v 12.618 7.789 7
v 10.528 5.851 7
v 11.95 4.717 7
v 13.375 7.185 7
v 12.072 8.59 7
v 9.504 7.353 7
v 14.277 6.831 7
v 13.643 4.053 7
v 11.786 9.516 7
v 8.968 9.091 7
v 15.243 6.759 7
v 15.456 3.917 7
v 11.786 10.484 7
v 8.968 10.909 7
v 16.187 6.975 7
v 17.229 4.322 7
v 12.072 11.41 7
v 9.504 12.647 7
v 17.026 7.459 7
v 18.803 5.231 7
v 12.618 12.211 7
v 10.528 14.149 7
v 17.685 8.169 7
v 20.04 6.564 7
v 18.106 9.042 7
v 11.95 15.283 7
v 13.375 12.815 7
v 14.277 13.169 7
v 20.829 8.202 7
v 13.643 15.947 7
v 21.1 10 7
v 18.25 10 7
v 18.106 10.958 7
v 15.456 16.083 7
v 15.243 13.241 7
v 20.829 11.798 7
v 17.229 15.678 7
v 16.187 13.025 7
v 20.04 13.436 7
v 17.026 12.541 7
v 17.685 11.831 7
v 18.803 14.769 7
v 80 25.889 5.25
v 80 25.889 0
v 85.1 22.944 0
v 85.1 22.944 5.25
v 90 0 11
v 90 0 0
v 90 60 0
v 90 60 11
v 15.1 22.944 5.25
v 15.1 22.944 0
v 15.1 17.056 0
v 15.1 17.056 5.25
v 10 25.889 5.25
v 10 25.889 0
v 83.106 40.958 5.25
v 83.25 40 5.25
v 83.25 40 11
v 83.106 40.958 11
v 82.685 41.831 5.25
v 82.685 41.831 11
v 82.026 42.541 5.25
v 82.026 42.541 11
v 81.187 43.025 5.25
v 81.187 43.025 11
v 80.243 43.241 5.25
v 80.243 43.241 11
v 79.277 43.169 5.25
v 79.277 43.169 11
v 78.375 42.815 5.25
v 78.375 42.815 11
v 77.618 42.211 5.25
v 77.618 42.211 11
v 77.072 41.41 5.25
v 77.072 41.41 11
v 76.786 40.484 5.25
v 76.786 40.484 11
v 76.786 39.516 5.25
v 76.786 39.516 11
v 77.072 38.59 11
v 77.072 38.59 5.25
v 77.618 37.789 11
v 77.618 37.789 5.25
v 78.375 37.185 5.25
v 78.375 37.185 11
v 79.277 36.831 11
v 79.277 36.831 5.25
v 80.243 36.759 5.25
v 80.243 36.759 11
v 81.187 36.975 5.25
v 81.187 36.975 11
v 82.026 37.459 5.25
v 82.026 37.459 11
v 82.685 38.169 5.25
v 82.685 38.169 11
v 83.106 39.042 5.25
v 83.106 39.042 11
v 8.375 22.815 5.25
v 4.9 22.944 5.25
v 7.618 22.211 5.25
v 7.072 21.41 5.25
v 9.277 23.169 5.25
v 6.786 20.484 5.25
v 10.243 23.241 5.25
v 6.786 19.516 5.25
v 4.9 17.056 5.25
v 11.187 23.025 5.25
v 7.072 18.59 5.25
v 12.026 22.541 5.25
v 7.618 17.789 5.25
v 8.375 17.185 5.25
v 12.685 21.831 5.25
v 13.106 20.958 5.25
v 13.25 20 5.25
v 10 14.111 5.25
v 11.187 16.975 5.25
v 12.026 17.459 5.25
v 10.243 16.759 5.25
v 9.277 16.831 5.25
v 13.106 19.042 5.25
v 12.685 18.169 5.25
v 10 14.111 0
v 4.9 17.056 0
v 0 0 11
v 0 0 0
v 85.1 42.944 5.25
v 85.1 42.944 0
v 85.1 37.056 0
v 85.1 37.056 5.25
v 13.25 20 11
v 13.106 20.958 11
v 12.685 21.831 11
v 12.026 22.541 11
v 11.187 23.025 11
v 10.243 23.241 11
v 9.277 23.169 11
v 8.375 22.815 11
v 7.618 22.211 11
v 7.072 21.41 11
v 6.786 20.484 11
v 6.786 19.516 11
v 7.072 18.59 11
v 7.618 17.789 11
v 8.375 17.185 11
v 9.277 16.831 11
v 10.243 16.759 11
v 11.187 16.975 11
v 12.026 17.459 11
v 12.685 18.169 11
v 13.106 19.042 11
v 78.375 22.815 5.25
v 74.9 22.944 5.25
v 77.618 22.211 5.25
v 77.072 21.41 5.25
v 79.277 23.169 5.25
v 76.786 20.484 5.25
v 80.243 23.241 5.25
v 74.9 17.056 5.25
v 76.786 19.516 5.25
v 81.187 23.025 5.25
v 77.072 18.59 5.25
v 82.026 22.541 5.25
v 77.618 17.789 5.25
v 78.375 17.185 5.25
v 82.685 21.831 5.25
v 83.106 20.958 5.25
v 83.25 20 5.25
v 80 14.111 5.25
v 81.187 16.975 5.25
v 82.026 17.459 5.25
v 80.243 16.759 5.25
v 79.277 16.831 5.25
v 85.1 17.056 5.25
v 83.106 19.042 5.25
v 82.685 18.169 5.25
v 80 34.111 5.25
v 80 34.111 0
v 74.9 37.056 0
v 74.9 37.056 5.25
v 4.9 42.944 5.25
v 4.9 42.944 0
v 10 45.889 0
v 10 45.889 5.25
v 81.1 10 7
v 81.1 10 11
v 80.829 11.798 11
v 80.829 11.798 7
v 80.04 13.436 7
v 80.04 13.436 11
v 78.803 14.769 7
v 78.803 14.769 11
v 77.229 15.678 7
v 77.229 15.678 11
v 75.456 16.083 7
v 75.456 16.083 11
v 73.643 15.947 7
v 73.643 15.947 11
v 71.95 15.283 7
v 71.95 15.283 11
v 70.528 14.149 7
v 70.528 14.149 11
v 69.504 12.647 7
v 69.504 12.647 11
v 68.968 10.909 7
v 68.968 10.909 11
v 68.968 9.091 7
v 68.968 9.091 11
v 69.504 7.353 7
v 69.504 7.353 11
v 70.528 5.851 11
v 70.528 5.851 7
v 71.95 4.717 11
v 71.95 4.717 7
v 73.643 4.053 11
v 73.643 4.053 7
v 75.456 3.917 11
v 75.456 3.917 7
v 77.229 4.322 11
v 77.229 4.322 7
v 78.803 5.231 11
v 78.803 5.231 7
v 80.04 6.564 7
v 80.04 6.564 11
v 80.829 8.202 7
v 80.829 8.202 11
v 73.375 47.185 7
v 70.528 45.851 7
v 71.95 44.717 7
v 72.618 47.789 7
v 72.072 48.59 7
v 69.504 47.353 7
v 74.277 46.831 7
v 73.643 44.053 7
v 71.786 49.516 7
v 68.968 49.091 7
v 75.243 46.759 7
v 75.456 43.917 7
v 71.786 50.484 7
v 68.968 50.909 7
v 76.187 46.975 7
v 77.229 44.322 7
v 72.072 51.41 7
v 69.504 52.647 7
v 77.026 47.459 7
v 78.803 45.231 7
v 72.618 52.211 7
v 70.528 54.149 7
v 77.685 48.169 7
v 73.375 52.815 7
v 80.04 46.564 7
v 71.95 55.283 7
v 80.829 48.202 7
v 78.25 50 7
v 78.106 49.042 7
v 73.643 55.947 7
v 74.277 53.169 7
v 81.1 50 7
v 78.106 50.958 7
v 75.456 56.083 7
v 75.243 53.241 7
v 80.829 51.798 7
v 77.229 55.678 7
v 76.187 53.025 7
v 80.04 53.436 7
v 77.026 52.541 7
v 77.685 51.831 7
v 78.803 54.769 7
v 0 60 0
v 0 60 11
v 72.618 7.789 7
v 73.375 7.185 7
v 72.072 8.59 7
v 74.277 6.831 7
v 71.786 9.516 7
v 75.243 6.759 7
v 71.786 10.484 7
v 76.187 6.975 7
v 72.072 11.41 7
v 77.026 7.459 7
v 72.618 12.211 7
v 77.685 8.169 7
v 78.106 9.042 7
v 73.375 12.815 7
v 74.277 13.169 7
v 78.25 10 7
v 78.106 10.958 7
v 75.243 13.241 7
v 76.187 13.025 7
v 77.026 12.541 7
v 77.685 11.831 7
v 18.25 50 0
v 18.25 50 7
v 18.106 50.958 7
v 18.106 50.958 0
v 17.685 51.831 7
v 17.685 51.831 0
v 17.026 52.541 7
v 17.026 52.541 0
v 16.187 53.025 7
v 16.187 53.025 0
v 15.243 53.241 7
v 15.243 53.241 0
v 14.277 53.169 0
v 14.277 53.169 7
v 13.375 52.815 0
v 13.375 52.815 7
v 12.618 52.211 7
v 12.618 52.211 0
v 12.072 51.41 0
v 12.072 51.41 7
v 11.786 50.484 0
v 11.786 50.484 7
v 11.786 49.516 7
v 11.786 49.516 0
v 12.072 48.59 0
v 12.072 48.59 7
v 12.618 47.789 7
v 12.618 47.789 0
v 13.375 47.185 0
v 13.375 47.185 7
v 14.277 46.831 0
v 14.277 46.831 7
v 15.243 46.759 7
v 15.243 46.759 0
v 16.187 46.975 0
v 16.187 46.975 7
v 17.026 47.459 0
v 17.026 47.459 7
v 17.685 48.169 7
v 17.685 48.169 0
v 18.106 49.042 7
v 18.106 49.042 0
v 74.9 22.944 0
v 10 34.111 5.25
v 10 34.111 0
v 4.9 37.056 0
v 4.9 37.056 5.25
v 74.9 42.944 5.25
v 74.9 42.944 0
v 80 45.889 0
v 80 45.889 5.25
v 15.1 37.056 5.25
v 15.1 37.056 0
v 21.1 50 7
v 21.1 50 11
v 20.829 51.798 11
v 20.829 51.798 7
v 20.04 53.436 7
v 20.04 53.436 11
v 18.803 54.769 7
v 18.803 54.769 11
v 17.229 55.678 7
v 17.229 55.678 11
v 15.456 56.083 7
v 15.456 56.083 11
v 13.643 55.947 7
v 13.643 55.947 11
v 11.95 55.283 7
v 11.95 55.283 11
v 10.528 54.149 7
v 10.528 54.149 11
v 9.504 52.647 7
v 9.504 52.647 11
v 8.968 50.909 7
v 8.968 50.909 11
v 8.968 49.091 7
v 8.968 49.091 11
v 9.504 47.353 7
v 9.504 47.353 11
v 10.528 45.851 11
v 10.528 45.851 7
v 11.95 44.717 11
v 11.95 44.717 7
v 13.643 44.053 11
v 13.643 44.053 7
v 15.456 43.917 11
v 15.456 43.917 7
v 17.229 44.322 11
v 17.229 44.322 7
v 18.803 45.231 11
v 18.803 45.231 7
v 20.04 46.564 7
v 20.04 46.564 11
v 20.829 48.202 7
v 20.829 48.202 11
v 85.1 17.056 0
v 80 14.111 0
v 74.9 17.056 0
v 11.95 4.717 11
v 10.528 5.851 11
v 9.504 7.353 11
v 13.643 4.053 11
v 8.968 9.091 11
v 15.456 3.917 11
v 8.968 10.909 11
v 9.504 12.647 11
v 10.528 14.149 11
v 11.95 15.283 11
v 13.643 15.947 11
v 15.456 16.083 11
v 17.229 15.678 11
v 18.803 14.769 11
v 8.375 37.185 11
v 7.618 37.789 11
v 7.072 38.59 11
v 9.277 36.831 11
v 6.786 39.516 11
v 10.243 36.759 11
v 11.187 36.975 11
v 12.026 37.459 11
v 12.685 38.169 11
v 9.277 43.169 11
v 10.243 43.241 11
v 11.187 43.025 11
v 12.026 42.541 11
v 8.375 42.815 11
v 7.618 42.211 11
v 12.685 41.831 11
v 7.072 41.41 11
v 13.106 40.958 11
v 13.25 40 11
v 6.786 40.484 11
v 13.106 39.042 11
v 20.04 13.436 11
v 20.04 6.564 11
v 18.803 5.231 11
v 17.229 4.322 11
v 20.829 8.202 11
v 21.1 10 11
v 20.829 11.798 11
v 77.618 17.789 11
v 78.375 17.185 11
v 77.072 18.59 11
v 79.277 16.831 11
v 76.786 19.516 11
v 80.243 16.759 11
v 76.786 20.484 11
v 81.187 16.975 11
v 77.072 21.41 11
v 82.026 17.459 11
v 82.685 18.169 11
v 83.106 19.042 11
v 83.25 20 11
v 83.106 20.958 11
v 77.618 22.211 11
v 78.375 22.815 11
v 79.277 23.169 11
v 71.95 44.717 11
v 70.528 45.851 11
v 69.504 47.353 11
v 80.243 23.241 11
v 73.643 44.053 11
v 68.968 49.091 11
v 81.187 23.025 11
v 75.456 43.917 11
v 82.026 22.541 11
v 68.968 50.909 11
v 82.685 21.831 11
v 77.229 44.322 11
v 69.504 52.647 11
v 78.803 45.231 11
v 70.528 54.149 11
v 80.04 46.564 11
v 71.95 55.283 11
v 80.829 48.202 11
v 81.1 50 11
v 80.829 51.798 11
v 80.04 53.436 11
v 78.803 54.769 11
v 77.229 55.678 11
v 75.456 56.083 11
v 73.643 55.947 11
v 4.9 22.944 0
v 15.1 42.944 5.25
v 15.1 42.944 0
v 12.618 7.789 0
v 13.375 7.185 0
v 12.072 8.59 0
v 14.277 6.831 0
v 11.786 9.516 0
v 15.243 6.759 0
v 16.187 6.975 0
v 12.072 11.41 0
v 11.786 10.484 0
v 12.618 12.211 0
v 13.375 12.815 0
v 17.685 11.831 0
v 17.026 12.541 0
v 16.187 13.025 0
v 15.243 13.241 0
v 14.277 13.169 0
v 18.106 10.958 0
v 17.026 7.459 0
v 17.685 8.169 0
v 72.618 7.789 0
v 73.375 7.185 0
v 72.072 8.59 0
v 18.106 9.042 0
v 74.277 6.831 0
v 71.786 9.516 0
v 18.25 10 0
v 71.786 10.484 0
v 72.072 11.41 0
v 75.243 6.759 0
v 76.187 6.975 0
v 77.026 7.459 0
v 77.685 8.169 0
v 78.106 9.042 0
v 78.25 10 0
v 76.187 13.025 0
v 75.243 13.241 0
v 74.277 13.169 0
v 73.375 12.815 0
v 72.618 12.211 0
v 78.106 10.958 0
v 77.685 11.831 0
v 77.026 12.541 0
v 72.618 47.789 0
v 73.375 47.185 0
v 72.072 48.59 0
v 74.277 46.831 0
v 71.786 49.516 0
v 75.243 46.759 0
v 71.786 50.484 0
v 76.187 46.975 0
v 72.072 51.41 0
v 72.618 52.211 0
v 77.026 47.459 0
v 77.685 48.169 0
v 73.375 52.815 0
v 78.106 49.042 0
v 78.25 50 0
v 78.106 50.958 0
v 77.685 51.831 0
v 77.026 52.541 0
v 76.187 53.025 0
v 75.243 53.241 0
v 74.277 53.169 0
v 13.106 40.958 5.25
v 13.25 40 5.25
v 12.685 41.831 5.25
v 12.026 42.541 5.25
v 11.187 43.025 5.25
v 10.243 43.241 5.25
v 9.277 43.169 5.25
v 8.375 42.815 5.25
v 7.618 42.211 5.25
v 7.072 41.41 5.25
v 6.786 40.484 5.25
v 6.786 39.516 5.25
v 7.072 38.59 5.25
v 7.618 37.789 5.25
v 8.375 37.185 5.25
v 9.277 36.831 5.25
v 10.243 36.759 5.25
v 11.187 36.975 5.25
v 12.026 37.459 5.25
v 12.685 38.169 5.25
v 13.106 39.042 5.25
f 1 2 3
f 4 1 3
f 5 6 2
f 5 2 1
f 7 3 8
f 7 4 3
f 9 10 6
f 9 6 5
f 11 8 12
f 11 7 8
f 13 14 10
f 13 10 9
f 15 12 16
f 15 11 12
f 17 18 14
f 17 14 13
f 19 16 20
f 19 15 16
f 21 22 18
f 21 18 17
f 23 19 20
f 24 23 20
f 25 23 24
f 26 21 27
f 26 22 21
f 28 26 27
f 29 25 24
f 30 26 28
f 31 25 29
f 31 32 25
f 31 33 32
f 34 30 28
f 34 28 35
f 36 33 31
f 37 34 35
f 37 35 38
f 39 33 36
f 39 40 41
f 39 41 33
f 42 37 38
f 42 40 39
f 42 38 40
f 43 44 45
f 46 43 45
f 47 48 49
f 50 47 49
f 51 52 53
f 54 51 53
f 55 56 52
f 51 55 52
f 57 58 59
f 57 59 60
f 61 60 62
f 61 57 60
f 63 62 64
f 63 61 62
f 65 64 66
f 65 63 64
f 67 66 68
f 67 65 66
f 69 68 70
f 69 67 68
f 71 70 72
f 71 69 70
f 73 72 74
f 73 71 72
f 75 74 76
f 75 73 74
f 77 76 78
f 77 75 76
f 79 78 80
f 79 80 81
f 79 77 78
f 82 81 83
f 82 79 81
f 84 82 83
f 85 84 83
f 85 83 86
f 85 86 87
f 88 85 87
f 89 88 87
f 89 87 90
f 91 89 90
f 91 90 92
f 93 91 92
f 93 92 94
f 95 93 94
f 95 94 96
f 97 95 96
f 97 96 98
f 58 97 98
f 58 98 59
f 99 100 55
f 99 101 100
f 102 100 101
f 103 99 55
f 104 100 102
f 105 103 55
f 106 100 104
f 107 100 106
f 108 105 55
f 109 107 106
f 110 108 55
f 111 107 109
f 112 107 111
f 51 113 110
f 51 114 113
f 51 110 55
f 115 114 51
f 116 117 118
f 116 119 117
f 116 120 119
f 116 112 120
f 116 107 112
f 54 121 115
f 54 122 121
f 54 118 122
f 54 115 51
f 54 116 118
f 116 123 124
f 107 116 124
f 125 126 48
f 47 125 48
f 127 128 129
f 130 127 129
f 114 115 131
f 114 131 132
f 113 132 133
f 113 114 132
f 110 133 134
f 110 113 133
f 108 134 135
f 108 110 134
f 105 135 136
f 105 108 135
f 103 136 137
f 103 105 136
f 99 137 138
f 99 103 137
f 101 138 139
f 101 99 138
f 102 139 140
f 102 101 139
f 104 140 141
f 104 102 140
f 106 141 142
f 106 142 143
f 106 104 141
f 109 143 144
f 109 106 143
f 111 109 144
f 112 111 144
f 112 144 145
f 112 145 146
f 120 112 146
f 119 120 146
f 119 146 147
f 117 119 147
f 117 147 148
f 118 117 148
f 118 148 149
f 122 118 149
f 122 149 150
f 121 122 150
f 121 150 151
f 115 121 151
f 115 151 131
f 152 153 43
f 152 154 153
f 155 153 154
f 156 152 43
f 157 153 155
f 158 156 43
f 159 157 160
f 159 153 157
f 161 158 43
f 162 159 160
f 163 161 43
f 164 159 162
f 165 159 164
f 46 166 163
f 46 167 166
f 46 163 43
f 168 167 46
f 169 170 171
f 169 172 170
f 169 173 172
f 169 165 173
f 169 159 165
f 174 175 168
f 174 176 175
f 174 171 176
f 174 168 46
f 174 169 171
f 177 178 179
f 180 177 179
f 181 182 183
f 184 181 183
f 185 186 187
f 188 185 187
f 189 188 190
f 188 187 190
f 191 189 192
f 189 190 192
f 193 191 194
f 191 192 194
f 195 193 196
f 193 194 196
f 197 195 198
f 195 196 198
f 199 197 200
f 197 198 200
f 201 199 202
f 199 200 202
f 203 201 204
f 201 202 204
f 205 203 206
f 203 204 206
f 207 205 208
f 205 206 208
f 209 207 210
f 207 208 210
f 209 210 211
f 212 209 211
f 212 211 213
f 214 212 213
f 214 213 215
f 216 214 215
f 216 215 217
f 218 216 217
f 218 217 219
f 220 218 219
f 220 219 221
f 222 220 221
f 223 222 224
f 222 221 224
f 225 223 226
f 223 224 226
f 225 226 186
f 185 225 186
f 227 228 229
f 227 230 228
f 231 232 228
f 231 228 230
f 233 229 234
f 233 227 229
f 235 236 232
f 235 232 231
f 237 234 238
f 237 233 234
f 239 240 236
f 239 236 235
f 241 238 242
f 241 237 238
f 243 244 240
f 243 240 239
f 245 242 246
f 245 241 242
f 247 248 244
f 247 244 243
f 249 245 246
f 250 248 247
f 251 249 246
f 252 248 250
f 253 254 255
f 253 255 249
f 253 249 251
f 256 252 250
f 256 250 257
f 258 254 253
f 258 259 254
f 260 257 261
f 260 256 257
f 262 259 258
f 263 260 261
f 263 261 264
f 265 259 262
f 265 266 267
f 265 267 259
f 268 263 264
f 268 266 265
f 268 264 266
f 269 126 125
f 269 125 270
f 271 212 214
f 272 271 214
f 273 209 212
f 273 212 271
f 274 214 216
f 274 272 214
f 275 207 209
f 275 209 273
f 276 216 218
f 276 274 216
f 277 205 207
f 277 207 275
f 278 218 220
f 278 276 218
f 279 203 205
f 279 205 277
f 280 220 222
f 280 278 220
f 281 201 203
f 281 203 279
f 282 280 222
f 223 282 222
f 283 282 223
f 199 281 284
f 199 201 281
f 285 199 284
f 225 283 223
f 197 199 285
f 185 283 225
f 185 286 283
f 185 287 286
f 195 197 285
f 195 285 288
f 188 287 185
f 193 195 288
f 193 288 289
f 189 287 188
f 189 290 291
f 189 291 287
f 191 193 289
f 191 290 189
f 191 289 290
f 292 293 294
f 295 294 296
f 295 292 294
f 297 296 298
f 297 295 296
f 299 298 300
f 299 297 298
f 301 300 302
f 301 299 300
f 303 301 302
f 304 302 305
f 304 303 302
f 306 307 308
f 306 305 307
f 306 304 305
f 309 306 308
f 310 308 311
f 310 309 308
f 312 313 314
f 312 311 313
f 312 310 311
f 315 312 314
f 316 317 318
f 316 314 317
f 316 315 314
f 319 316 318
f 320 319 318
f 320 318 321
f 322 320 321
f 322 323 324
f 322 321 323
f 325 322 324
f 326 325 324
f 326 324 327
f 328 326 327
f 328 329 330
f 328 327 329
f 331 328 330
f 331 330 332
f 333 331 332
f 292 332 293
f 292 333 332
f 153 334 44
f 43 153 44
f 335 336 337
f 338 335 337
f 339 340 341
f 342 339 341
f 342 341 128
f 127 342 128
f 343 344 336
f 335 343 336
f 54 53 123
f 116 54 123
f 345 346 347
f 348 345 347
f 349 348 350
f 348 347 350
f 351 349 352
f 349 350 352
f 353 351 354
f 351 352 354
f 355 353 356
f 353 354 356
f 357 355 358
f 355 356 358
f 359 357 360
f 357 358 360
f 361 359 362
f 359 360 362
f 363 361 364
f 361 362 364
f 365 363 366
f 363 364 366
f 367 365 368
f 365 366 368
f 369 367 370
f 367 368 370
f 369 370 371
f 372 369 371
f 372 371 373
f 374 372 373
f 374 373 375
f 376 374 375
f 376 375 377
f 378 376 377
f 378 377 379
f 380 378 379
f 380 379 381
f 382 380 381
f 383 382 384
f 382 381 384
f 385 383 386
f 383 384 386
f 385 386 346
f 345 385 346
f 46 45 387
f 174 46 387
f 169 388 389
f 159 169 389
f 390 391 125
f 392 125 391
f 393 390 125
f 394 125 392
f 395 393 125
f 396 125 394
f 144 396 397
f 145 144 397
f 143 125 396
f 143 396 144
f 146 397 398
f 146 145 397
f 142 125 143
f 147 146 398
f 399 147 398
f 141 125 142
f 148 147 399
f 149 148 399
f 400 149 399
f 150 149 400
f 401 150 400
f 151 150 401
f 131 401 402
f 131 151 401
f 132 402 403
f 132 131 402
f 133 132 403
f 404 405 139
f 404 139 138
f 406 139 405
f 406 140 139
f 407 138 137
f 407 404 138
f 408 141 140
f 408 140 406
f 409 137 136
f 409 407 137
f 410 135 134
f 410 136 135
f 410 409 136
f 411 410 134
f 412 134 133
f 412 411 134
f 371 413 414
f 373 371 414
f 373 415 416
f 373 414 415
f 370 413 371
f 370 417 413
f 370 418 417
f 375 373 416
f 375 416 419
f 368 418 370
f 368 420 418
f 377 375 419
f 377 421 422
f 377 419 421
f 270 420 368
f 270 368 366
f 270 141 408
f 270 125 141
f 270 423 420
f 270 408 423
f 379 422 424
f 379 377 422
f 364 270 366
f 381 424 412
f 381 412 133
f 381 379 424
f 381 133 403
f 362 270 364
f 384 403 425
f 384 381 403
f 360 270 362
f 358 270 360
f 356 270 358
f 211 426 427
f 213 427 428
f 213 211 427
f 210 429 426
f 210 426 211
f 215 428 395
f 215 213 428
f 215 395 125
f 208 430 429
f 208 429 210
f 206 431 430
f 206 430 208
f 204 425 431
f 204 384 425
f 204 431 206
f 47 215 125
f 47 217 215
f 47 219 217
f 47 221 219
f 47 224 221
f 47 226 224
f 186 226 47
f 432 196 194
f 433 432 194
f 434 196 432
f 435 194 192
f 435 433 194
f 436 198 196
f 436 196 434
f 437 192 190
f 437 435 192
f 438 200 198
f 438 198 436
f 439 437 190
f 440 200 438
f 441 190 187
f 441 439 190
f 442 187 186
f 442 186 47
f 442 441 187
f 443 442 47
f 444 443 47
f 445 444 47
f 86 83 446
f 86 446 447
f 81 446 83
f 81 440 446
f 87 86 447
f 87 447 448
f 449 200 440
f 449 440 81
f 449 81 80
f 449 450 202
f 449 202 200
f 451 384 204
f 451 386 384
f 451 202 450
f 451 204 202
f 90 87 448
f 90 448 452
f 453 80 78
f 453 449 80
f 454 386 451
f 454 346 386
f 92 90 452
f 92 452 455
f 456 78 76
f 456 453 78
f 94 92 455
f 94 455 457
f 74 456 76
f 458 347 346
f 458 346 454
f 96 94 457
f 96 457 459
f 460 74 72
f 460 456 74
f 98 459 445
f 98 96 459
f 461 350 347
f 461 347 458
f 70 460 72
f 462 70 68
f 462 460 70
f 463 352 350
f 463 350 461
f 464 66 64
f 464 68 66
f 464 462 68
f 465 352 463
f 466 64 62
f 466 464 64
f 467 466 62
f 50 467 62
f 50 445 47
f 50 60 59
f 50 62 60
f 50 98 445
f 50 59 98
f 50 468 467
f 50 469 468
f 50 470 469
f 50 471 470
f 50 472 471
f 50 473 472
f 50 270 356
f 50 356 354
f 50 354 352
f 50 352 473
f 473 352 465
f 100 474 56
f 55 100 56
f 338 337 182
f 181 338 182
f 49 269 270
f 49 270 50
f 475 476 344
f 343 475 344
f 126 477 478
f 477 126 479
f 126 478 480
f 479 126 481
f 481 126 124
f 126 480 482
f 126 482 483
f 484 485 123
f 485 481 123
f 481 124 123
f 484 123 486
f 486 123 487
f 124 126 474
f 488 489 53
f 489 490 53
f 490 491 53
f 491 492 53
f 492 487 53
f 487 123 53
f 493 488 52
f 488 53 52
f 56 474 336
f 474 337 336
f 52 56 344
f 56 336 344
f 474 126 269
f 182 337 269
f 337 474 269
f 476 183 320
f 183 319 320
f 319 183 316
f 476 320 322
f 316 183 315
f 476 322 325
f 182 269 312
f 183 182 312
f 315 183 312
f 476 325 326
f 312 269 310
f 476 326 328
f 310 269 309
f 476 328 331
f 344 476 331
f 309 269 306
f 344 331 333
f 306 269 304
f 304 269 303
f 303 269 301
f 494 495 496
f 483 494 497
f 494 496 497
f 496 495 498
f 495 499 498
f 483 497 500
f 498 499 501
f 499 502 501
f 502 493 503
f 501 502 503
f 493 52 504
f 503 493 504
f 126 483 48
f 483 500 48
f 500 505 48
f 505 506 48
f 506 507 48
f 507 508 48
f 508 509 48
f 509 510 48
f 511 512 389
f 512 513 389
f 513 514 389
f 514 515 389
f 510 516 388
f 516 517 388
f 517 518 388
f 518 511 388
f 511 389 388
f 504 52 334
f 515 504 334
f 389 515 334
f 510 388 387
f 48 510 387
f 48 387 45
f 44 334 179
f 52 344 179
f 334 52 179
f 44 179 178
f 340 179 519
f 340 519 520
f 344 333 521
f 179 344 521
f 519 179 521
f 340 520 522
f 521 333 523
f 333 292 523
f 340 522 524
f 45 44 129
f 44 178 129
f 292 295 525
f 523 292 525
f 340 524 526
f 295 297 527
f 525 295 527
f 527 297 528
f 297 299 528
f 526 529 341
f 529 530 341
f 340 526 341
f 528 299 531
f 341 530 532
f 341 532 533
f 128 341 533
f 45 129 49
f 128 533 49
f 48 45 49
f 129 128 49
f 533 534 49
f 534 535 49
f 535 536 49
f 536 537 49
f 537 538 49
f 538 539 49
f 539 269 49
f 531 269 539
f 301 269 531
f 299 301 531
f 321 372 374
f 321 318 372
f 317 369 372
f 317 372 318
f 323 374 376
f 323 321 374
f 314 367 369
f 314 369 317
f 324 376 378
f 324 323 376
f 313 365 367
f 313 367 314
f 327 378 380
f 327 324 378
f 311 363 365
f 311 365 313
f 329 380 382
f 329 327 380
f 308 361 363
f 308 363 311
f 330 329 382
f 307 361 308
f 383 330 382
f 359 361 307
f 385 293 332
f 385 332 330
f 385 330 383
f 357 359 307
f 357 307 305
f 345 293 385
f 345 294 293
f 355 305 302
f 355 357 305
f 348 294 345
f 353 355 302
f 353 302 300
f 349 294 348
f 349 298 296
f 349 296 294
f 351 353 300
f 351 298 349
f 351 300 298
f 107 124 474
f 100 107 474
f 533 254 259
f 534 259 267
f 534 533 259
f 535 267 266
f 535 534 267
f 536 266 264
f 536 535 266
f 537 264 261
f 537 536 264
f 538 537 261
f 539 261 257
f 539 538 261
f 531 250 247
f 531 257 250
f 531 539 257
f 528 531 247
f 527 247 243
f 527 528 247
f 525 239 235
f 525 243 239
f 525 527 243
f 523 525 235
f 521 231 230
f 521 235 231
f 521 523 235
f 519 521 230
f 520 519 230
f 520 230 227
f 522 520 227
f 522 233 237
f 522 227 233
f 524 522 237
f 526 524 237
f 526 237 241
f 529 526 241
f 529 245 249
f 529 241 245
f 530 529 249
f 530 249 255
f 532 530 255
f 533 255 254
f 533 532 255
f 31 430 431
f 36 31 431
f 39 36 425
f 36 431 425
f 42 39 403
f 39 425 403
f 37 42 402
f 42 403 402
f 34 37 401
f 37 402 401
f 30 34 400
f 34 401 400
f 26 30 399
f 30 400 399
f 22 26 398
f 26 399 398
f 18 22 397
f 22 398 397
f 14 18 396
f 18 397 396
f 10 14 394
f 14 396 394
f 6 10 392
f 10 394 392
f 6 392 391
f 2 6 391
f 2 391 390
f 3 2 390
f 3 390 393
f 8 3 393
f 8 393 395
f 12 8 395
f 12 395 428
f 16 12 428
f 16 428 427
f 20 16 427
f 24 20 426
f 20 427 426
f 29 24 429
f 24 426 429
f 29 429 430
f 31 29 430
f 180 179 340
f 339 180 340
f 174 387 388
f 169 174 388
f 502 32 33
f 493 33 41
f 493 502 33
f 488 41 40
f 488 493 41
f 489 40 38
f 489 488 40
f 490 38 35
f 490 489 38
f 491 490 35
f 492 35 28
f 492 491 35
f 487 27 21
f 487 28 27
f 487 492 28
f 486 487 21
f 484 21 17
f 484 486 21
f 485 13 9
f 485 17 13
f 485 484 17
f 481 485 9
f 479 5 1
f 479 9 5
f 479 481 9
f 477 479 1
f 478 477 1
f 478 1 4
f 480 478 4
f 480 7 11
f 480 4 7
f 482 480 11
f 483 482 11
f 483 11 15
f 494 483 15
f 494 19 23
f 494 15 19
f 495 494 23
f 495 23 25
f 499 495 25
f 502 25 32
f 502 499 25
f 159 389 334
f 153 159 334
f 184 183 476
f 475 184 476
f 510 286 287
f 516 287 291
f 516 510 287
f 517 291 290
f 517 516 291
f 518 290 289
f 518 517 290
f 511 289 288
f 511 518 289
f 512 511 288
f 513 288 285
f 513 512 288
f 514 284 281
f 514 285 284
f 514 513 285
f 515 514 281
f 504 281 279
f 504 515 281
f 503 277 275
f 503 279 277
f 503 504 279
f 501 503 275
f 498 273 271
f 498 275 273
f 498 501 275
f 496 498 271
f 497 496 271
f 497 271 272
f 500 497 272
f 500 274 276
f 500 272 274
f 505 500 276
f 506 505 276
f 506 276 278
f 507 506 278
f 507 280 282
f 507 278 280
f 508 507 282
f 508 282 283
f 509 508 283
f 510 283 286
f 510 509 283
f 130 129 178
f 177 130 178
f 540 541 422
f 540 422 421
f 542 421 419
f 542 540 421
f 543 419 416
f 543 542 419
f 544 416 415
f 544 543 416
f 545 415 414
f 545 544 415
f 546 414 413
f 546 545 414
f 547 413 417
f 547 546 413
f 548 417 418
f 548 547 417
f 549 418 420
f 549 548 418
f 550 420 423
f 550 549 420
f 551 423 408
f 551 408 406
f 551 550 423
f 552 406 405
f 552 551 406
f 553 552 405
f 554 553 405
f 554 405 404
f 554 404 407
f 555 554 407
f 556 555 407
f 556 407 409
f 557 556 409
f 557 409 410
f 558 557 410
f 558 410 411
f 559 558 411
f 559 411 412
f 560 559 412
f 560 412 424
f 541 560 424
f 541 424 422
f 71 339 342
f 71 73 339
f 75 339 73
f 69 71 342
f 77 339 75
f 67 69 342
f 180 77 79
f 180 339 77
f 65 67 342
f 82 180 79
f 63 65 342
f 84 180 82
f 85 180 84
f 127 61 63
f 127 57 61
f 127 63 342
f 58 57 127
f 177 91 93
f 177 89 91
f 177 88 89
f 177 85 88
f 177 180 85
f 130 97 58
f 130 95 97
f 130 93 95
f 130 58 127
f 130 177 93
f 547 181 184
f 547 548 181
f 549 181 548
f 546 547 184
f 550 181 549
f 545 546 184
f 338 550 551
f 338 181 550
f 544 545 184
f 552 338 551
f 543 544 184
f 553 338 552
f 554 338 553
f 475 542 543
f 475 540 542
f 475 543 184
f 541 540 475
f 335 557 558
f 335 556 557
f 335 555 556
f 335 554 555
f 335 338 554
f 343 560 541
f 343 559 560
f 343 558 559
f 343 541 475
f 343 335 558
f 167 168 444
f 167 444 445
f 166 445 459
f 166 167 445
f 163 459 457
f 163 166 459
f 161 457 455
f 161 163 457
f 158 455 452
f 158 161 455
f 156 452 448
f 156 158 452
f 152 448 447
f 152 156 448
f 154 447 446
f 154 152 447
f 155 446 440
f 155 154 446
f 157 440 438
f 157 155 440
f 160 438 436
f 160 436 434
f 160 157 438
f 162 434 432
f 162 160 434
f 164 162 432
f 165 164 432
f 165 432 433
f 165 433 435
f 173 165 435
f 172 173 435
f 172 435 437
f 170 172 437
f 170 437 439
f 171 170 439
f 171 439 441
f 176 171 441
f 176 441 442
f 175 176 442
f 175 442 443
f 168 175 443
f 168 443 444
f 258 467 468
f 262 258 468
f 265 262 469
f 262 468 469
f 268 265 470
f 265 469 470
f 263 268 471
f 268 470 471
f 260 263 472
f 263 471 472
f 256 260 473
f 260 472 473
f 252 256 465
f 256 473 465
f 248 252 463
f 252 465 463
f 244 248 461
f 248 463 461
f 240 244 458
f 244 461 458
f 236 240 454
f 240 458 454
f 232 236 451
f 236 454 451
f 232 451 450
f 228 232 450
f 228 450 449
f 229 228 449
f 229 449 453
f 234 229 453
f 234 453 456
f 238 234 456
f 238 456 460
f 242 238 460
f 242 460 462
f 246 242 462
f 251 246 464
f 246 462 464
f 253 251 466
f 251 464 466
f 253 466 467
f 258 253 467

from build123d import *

# Parameters (mm, degrees)
SKETCH_W        = 90
SKETCH_H        = 60
SKETCH_R        = 3.25
PAD_DEPTH       = 11
SKETCH001_R     = 6.1
POCKET_DEPTH    = 4
POCKET001_DEPTH = 5.25


with BuildPart() as part:
    # Sketch → Pad (new body)
    with BuildSketch(Plane.XY):
        with Locations((45, 30)):
            Rectangle(SKETCH_W, SKETCH_H)
        with Locations((10, 40)):
            Circle(SKETCH_R, mode=Mode.SUBTRACT)
        with Locations((80, 40)):
            Circle(SKETCH_R, mode=Mode.SUBTRACT)
        with Locations((10, 20)):
            Circle(SKETCH_R, mode=Mode.SUBTRACT)
        with Locations((80, 20)):
            Circle(SKETCH_R, mode=Mode.SUBTRACT)
        with Locations((15, 50)):
            Circle(SKETCH_R, mode=Mode.SUBTRACT)
        with Locations((75, 50)):
            Circle(SKETCH_R, mode=Mode.SUBTRACT)
        with Locations((75, 10)):
            Circle(SKETCH_R, mode=Mode.SUBTRACT)
        with Locations((15, 10)):
            Circle(SKETCH_R, mode=Mode.SUBTRACT)
    extrude(amount=PAD_DEPTH)

    # Sketch001 (on Face14 of Pad) → Pocket (cut)
    with BuildSketch(Plane.XY.offset(11)):
        with Locations((15, 50)):
            Circle(SKETCH001_R)
        with Locations((75, 50)):
            Circle(SKETCH001_R)
        with Locations((75, 10)):
            Circle(SKETCH001_R)
        with Locations((15, 10)):
            Circle(SKETCH001_R)
    extrude(amount=-POCKET_DEPTH, mode=Mode.SUBTRACT)

    # Sketch002 (on Face4 of Pocket) → Pocket001 (cut)
    with BuildSketch(Plane(origin=(0, 0, 0), x_dir=(1, 0, 0), z_dir=(0, 0, -1))):
        Polygon((15.1, -17.055514), (10, -14.111027), (4.9, -17.055514), (4.9, -22.944486), (10, -25.888973), (15.1, -22.944486), align=None)
        Polygon((80, -14.111027), (74.9, -17.055514), (74.9, -22.944486), (80, -25.888973), (85.1, -22.944486), (85.1, -17.055514), align=None)
        Polygon((10, -34.111027), (4.9, -37.055514), (4.9, -42.944486), (10, -45.888973), (15.1, -42.944486), (15.1, -37.055514), align=None)
        Polygon((80, -34.111027), (74.9, -37.055514), (74.9, -42.944486), (80, -45.888973), (85.1, -42.944486), (85.1, -37.055514), align=None)
    extrude(amount=-POCKET001_DEPTH, mode=Mode.SUBTRACT)


solid = part.part
